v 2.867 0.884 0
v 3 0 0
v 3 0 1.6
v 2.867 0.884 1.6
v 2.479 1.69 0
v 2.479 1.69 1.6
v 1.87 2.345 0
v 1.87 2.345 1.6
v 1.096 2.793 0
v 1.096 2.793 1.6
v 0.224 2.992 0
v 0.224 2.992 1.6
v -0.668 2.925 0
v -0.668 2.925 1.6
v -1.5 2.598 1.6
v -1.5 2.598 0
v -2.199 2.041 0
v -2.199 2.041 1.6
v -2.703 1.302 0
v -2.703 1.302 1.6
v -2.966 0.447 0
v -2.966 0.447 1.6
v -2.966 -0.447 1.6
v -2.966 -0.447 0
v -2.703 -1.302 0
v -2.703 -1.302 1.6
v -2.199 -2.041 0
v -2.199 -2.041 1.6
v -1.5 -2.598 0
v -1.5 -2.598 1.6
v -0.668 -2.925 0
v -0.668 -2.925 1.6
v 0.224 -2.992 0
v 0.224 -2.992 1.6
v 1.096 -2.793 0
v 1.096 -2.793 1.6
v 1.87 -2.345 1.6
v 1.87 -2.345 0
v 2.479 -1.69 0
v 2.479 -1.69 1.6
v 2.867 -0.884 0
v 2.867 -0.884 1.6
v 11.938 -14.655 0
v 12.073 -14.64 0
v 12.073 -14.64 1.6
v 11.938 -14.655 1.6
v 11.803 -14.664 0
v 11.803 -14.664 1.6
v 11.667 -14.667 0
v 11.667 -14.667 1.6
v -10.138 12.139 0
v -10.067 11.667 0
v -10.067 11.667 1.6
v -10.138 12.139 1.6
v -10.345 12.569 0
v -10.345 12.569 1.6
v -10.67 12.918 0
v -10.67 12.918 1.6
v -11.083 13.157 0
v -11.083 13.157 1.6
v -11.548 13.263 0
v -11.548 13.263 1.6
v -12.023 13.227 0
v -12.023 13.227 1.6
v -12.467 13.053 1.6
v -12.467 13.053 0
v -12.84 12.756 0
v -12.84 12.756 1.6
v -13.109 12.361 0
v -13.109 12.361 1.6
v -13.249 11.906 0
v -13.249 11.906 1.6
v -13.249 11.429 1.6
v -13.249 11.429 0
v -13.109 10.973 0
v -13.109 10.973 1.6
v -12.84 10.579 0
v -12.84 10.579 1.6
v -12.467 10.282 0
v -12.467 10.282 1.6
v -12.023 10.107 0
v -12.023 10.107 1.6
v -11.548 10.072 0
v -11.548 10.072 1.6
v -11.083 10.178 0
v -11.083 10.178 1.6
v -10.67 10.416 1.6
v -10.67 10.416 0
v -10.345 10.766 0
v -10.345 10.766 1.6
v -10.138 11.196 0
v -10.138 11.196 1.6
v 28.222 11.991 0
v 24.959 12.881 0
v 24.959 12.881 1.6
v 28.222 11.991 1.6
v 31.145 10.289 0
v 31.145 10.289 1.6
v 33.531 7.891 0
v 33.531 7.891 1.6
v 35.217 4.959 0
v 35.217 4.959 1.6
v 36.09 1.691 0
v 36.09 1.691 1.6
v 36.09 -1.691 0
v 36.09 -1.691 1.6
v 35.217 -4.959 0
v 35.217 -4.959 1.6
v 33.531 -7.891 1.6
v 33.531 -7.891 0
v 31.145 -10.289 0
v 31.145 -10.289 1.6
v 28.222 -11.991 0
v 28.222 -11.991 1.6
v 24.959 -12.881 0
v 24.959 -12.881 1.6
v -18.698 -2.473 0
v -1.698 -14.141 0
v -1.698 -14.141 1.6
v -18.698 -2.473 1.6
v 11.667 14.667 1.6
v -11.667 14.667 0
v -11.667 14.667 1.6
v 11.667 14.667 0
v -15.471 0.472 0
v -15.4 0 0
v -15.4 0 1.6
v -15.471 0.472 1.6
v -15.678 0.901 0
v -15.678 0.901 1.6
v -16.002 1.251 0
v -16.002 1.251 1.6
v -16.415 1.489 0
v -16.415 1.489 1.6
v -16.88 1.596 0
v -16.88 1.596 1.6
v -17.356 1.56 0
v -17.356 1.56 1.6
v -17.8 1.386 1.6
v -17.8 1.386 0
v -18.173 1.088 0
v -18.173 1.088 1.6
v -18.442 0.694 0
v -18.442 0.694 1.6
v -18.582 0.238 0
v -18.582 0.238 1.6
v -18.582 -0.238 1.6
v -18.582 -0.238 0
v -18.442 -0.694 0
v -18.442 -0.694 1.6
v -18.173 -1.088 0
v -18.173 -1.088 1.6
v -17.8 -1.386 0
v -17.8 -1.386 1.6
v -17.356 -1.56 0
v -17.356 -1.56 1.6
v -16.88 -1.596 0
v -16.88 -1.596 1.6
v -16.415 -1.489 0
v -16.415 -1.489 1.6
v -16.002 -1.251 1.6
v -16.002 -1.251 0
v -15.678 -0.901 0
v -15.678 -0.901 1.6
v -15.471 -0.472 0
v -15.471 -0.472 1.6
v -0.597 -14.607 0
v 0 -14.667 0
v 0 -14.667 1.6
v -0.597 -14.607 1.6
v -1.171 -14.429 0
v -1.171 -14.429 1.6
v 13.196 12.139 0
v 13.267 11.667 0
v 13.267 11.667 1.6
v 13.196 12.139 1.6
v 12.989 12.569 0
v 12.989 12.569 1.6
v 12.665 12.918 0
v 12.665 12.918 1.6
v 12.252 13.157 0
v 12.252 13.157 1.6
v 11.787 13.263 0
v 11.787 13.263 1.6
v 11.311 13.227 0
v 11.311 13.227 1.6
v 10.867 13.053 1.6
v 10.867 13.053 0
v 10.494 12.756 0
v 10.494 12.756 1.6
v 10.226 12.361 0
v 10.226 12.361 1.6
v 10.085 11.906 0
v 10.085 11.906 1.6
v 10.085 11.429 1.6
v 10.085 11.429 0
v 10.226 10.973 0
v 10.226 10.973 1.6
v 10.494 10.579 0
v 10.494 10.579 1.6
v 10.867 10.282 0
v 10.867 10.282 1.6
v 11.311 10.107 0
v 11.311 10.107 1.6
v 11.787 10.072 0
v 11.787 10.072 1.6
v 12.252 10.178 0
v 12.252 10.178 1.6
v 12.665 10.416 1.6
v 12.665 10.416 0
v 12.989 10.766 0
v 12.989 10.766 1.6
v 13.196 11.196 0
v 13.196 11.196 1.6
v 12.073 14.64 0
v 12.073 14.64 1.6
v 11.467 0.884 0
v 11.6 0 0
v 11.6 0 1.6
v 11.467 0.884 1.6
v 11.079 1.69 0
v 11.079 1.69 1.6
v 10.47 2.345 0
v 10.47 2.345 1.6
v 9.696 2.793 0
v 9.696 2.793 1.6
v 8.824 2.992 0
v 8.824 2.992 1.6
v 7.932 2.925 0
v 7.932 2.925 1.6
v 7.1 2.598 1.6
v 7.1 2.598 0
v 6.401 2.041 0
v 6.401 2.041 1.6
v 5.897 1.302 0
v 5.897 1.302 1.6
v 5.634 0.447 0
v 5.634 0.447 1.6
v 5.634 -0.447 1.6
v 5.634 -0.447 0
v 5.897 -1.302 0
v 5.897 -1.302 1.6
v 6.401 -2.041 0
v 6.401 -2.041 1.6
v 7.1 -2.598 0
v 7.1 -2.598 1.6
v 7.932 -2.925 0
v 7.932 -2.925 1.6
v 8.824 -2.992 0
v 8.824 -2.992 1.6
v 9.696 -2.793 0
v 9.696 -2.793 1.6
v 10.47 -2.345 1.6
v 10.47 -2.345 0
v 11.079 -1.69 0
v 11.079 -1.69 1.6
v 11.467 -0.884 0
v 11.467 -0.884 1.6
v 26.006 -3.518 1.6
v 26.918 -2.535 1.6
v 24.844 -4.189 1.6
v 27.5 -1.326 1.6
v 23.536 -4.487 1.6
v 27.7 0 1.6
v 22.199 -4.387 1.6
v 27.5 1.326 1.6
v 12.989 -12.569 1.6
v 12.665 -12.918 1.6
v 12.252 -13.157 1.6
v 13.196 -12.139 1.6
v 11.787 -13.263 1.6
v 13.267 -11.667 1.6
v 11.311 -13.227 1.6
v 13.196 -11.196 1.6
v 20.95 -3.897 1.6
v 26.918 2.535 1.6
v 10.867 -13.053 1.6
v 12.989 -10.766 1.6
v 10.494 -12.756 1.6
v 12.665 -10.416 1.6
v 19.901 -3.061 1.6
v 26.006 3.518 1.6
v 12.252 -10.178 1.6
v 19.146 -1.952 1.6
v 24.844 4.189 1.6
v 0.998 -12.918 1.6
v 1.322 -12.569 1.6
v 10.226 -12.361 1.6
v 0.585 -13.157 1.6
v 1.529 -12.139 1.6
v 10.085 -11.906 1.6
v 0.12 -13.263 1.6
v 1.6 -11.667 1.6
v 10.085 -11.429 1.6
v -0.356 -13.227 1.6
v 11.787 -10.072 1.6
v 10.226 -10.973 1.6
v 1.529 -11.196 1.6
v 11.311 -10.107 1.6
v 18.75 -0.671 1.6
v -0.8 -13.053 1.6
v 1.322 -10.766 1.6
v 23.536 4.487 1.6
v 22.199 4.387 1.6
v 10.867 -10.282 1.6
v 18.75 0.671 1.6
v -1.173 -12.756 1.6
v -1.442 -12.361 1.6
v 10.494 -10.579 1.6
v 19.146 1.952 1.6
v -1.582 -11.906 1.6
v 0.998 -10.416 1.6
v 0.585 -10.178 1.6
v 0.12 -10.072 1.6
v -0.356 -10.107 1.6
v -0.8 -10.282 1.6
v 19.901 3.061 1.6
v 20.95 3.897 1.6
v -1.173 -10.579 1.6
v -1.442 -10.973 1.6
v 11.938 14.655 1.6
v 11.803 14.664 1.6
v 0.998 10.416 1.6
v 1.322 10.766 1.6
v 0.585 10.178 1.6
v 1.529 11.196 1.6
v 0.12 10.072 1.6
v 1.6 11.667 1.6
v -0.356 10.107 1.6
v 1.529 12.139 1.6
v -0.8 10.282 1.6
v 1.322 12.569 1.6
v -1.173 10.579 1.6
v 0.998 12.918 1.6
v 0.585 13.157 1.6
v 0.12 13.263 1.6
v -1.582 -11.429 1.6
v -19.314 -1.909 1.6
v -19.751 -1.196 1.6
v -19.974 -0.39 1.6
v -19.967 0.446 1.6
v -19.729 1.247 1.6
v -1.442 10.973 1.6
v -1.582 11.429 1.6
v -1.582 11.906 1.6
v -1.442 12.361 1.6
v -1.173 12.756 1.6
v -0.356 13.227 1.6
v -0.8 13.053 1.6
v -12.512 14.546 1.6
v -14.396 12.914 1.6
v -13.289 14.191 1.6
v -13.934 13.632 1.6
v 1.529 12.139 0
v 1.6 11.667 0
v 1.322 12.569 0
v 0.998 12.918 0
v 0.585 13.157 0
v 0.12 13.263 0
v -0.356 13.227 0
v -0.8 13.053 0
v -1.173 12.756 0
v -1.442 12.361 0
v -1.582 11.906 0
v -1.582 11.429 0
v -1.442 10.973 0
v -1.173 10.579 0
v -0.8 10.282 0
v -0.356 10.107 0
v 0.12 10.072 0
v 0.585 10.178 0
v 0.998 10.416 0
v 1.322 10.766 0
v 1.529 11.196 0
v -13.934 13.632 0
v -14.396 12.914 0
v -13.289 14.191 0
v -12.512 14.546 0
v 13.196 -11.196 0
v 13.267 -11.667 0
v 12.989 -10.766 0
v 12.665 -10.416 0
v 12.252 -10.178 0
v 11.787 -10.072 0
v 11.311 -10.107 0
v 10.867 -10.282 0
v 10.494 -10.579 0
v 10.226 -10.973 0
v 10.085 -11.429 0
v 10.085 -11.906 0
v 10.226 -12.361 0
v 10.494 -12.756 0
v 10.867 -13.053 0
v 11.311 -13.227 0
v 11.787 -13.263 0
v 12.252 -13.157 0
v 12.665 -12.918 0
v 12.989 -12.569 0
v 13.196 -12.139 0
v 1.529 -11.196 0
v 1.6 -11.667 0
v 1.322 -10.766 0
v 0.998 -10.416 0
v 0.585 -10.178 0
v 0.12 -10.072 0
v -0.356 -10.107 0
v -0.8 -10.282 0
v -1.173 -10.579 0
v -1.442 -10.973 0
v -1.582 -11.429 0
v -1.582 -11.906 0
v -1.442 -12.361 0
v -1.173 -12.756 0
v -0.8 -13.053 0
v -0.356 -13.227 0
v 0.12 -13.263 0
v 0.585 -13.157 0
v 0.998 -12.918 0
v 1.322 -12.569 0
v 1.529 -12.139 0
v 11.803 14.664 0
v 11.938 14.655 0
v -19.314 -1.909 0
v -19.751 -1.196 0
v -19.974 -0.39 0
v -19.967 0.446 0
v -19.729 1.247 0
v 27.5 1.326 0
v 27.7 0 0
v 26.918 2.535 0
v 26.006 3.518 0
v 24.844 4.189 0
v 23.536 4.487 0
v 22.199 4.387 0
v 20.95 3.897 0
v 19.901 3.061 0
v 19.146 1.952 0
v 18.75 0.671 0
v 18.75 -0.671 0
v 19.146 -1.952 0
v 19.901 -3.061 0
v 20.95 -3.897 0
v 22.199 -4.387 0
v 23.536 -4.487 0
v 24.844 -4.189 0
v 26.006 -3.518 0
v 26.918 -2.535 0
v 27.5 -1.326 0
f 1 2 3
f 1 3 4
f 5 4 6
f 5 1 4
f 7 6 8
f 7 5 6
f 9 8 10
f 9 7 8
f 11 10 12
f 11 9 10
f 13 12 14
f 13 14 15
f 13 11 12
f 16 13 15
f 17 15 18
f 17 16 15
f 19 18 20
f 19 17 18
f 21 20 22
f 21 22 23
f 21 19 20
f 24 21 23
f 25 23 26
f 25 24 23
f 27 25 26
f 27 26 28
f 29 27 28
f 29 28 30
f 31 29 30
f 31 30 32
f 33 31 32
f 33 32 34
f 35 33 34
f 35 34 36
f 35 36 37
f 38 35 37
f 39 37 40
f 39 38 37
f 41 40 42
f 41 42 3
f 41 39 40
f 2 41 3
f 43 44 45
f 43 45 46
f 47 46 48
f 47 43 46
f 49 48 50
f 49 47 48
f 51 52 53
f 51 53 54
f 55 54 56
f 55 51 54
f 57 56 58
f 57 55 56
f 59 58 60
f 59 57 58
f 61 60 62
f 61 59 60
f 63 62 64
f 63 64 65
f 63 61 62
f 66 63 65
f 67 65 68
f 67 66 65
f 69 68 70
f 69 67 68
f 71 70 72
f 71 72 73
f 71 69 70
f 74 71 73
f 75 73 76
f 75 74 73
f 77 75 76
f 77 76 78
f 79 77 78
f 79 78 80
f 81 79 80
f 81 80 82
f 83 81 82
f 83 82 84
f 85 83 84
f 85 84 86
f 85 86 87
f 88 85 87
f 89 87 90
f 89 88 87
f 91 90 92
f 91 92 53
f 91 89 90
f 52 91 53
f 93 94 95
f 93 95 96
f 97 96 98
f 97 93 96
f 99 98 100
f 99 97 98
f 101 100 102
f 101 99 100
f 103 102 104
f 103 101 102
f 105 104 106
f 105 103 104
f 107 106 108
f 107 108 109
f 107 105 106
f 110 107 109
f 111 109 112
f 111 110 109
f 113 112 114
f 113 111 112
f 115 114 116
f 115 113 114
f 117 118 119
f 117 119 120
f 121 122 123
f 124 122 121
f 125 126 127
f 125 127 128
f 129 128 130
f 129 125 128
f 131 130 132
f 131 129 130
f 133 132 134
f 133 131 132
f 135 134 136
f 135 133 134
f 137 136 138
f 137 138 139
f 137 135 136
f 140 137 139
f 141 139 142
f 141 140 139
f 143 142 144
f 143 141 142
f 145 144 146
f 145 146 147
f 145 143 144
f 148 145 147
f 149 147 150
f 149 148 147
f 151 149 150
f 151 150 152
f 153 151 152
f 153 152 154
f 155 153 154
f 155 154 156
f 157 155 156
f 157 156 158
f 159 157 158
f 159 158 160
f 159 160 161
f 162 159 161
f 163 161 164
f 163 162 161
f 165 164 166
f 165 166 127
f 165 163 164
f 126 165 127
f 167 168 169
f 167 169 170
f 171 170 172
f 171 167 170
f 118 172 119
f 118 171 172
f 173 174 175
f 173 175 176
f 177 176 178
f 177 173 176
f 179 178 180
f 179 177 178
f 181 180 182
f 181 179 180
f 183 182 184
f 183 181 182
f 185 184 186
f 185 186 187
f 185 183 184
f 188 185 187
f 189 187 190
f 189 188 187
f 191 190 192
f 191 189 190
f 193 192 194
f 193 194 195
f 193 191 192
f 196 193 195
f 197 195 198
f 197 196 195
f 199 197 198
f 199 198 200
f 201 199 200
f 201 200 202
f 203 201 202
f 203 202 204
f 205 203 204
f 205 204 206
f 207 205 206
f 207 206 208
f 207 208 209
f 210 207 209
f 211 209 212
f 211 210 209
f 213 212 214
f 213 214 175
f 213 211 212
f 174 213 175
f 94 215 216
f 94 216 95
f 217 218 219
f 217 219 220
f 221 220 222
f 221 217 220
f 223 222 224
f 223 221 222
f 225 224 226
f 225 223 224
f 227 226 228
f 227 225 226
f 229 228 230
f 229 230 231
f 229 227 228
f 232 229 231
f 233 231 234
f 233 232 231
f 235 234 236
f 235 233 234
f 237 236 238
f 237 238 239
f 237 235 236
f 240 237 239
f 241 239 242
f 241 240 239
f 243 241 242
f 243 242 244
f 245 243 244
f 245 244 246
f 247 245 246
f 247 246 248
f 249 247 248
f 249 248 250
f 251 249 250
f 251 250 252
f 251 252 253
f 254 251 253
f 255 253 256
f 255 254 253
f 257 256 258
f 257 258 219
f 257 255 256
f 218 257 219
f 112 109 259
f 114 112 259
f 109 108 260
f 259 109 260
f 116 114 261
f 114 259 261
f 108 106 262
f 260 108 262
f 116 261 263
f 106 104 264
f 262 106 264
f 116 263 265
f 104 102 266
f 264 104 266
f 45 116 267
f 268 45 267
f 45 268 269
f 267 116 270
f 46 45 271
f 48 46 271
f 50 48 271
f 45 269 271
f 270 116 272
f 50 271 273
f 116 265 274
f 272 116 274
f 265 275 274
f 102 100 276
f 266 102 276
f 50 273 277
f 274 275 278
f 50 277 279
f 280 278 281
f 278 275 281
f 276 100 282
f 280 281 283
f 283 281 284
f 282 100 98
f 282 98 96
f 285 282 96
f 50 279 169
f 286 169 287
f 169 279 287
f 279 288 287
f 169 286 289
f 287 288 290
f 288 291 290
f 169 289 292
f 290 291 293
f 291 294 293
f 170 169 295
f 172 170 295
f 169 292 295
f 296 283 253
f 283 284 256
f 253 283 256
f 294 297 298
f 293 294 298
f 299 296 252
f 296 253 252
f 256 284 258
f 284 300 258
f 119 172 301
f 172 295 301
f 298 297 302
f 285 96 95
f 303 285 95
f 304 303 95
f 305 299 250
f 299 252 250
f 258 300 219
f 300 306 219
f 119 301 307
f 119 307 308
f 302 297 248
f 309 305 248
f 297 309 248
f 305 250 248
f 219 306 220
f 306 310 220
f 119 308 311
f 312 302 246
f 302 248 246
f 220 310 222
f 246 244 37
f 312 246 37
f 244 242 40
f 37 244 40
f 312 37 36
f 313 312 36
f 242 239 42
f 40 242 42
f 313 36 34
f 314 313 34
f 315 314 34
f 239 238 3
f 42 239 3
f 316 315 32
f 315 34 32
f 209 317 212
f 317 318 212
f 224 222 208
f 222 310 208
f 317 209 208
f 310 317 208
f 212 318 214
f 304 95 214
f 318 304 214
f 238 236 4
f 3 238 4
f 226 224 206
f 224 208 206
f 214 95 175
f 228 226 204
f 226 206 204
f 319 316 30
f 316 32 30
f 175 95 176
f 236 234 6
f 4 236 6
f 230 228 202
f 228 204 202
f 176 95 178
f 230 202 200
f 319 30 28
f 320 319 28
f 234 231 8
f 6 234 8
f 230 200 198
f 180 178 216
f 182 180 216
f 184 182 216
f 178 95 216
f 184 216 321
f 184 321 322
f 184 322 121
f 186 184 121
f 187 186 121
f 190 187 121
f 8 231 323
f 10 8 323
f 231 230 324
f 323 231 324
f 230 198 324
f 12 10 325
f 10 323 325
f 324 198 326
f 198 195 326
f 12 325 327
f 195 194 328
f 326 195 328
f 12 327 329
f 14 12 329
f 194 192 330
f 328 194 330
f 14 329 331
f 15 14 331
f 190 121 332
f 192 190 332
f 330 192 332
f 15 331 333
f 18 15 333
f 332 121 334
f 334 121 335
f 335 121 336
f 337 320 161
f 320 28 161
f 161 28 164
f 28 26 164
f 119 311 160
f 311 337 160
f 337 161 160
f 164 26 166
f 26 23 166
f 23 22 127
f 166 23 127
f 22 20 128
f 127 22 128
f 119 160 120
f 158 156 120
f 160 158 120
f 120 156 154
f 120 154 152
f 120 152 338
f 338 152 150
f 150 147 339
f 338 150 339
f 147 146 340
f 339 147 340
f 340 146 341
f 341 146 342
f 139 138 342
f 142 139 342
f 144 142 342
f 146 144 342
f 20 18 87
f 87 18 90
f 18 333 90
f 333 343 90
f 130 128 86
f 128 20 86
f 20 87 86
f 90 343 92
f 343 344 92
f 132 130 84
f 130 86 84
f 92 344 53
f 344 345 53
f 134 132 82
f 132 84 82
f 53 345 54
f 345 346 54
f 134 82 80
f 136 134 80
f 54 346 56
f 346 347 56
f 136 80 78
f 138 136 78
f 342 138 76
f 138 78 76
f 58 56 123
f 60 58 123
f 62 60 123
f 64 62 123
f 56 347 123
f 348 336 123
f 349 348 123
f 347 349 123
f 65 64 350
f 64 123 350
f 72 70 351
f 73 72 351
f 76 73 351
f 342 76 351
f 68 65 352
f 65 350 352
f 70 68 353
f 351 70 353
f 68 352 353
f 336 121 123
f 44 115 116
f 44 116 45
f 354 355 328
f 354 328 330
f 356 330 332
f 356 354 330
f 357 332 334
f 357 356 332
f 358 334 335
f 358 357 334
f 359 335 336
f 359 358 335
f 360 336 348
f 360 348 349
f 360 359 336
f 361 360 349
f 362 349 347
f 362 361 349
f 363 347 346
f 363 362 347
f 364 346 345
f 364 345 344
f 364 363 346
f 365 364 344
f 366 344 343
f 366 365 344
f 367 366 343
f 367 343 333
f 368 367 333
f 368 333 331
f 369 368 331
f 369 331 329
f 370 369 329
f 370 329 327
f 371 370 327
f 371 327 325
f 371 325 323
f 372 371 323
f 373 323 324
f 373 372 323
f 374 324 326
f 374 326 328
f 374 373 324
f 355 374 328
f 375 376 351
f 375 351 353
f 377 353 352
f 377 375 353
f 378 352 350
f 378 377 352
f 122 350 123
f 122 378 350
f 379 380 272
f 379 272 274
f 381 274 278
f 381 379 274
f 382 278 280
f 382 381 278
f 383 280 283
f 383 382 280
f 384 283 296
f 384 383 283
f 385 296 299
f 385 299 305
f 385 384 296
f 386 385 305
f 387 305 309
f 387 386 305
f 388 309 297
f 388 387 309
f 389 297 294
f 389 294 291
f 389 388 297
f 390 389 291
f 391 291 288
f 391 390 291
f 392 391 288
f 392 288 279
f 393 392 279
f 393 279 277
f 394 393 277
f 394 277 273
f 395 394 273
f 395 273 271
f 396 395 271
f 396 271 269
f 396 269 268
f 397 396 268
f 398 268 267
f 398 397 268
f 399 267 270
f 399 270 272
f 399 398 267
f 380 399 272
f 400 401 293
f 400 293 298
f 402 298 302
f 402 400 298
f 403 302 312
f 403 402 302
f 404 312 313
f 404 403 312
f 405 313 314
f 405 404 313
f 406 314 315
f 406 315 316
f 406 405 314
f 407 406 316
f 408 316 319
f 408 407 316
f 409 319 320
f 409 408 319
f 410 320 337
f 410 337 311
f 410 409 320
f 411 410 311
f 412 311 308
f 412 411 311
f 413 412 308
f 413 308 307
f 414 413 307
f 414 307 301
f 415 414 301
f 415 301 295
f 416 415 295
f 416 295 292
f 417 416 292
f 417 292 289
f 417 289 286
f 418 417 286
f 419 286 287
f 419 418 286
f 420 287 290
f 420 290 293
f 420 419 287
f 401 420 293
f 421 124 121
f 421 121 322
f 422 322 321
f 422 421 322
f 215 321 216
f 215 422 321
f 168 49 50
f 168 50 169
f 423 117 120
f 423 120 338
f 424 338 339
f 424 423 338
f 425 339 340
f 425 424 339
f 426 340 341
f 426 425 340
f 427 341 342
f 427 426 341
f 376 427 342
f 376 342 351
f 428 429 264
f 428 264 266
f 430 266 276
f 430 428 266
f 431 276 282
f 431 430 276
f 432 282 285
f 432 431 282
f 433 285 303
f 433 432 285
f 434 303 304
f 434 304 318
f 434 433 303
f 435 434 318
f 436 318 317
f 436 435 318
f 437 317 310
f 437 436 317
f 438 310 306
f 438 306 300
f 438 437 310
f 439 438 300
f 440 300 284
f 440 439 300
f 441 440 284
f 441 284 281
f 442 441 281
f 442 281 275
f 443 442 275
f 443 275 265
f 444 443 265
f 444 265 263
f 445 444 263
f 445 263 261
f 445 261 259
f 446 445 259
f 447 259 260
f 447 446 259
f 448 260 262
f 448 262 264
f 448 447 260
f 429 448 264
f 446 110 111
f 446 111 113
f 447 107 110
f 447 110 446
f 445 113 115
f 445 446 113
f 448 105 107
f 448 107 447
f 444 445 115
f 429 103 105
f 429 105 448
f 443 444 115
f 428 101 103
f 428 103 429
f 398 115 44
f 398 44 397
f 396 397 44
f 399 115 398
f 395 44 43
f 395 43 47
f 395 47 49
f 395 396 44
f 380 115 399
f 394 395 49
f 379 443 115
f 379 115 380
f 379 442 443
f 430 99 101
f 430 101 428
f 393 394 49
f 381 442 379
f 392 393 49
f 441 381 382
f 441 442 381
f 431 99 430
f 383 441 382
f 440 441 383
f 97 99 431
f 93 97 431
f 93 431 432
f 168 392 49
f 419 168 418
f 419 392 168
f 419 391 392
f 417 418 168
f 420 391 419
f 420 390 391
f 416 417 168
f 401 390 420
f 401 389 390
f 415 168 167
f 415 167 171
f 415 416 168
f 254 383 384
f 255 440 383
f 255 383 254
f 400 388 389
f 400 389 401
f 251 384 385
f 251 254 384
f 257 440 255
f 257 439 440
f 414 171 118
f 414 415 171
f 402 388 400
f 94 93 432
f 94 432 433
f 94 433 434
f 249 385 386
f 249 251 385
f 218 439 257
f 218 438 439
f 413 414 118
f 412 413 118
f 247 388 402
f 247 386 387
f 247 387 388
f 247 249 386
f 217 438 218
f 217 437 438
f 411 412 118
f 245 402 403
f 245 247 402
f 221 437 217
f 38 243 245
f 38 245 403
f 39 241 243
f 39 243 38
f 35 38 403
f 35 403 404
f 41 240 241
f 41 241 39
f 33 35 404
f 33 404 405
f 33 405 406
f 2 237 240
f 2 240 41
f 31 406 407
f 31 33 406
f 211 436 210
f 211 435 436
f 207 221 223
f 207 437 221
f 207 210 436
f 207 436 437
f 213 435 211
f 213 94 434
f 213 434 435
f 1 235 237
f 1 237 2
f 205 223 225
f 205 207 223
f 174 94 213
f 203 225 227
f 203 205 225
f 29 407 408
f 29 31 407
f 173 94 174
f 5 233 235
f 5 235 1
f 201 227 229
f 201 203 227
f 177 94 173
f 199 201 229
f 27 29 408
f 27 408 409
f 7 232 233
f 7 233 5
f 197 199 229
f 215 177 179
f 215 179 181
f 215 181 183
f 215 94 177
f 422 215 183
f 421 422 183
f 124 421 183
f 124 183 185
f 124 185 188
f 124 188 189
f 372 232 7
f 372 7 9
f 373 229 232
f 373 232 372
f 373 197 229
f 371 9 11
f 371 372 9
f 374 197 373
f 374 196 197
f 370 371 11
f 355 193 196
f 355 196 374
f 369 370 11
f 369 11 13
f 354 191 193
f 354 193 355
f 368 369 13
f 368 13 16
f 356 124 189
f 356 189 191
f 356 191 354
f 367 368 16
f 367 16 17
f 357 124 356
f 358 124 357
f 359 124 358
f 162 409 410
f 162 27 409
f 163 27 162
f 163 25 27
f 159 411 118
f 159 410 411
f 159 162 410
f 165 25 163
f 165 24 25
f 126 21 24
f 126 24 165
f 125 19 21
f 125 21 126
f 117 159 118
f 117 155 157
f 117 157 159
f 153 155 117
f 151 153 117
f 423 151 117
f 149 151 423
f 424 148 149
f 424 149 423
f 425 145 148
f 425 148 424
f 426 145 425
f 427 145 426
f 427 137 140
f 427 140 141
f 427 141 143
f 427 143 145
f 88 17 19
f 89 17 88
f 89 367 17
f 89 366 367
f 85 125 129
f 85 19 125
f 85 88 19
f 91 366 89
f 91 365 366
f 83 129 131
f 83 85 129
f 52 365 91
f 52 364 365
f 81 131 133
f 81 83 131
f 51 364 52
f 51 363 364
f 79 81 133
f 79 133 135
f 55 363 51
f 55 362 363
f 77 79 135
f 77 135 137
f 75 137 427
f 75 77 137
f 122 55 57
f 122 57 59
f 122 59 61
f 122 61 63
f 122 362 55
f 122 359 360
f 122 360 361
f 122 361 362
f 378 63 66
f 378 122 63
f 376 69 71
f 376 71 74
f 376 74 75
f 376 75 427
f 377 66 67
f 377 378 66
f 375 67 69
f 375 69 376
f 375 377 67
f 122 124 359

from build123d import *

# Parameters (mm, degrees)
SKETCH1_R           = 3
SKETCH1_R_2         = 4.5
SKETCH1_R_3         = 1.6
BOSS_EXTRUDE3_DEPTH = 1.6


with BuildPart() as part:
    # Sketch1 → Boss-Extrude3 (new body)
    with BuildSketch(Plane.XY):
        with BuildLine():
            Line((12.073070054, 14.639688463), (24.958502044, 12.880515151))
            ThreePointArc((24.958502044, 12.880515151), (36.2, 0), (24.958502044, -12.880515151))
            Line((24.958502044, -12.880515151), (12.073070054, -14.639688463))
            ThreePointArc((12.073070054, -14.639688463), (11.870633815, -14.660360595), (11.66726189, -14.66726189))
            Line((11.66726189, -14.66726189), (0, -14.66726189))
            ThreePointArc((0, -14.66726189), (-0.888679088, -14.53261518), (-1.697586366, -14.140761542))
            Line((-1.697586366, -14.140761542), (-18.697586366, -2.473499652))
            ThreePointArc((-18.697586366, -2.473499652), (-19.891071988, -0.801063519), (-19.728500117, 1.247111507))
            Line((-19.728500117, 1.247111507), (-14.395762007, 12.914373397))
            ThreePointArc((-14.395762007, 12.914373397), (-13.288783625, 14.191279968), (-11.66726189, 14.66726189))
            Line((-11.66726189, 14.66726189), (11.66726189, 14.66726189))
            ThreePointArc((11.66726189, 14.66726189), (11.870633815, 14.660360595), (12.073070054, 14.639688463))
        make_face()
        Circle(SKETCH1_R, mode=Mode.SUBTRACT)
        with Locations((23.2, 0)):
            Circle(SKETCH1_R_2, mode=Mode.SUBTRACT)
        with Locations((8.6, 0)):
            Circle(SKETCH1_R, mode=Mode.SUBTRACT)
        with Locations((-17, 0)):
            Circle(SKETCH1_R_3, mode=Mode.SUBTRACT)
        with Locations((0, -11.66726189)):
            Circle(SKETCH1_R_3, mode=Mode.SUBTRACT)
        with Locations((11.66726189, -11.66726189)):
            Circle(SKETCH1_R_3, mode=Mode.SUBTRACT)
        with Locations((-11.66726189, 11.66726189)):
            Circle(SKETCH1_R_3, mode=Mode.SUBTRACT)
        with Locations((0, 11.66726189)):
            Circle(SKETCH1_R_3, mode=Mode.SUBTRACT)
        with Locations((11.66726189, 11.66726189)):
            Circle(SKETCH1_R_3, mode=Mode.SUBTRACT)
    extrude(amount=BOSS_EXTRUDE3_DEPTH)


solid = part.part
